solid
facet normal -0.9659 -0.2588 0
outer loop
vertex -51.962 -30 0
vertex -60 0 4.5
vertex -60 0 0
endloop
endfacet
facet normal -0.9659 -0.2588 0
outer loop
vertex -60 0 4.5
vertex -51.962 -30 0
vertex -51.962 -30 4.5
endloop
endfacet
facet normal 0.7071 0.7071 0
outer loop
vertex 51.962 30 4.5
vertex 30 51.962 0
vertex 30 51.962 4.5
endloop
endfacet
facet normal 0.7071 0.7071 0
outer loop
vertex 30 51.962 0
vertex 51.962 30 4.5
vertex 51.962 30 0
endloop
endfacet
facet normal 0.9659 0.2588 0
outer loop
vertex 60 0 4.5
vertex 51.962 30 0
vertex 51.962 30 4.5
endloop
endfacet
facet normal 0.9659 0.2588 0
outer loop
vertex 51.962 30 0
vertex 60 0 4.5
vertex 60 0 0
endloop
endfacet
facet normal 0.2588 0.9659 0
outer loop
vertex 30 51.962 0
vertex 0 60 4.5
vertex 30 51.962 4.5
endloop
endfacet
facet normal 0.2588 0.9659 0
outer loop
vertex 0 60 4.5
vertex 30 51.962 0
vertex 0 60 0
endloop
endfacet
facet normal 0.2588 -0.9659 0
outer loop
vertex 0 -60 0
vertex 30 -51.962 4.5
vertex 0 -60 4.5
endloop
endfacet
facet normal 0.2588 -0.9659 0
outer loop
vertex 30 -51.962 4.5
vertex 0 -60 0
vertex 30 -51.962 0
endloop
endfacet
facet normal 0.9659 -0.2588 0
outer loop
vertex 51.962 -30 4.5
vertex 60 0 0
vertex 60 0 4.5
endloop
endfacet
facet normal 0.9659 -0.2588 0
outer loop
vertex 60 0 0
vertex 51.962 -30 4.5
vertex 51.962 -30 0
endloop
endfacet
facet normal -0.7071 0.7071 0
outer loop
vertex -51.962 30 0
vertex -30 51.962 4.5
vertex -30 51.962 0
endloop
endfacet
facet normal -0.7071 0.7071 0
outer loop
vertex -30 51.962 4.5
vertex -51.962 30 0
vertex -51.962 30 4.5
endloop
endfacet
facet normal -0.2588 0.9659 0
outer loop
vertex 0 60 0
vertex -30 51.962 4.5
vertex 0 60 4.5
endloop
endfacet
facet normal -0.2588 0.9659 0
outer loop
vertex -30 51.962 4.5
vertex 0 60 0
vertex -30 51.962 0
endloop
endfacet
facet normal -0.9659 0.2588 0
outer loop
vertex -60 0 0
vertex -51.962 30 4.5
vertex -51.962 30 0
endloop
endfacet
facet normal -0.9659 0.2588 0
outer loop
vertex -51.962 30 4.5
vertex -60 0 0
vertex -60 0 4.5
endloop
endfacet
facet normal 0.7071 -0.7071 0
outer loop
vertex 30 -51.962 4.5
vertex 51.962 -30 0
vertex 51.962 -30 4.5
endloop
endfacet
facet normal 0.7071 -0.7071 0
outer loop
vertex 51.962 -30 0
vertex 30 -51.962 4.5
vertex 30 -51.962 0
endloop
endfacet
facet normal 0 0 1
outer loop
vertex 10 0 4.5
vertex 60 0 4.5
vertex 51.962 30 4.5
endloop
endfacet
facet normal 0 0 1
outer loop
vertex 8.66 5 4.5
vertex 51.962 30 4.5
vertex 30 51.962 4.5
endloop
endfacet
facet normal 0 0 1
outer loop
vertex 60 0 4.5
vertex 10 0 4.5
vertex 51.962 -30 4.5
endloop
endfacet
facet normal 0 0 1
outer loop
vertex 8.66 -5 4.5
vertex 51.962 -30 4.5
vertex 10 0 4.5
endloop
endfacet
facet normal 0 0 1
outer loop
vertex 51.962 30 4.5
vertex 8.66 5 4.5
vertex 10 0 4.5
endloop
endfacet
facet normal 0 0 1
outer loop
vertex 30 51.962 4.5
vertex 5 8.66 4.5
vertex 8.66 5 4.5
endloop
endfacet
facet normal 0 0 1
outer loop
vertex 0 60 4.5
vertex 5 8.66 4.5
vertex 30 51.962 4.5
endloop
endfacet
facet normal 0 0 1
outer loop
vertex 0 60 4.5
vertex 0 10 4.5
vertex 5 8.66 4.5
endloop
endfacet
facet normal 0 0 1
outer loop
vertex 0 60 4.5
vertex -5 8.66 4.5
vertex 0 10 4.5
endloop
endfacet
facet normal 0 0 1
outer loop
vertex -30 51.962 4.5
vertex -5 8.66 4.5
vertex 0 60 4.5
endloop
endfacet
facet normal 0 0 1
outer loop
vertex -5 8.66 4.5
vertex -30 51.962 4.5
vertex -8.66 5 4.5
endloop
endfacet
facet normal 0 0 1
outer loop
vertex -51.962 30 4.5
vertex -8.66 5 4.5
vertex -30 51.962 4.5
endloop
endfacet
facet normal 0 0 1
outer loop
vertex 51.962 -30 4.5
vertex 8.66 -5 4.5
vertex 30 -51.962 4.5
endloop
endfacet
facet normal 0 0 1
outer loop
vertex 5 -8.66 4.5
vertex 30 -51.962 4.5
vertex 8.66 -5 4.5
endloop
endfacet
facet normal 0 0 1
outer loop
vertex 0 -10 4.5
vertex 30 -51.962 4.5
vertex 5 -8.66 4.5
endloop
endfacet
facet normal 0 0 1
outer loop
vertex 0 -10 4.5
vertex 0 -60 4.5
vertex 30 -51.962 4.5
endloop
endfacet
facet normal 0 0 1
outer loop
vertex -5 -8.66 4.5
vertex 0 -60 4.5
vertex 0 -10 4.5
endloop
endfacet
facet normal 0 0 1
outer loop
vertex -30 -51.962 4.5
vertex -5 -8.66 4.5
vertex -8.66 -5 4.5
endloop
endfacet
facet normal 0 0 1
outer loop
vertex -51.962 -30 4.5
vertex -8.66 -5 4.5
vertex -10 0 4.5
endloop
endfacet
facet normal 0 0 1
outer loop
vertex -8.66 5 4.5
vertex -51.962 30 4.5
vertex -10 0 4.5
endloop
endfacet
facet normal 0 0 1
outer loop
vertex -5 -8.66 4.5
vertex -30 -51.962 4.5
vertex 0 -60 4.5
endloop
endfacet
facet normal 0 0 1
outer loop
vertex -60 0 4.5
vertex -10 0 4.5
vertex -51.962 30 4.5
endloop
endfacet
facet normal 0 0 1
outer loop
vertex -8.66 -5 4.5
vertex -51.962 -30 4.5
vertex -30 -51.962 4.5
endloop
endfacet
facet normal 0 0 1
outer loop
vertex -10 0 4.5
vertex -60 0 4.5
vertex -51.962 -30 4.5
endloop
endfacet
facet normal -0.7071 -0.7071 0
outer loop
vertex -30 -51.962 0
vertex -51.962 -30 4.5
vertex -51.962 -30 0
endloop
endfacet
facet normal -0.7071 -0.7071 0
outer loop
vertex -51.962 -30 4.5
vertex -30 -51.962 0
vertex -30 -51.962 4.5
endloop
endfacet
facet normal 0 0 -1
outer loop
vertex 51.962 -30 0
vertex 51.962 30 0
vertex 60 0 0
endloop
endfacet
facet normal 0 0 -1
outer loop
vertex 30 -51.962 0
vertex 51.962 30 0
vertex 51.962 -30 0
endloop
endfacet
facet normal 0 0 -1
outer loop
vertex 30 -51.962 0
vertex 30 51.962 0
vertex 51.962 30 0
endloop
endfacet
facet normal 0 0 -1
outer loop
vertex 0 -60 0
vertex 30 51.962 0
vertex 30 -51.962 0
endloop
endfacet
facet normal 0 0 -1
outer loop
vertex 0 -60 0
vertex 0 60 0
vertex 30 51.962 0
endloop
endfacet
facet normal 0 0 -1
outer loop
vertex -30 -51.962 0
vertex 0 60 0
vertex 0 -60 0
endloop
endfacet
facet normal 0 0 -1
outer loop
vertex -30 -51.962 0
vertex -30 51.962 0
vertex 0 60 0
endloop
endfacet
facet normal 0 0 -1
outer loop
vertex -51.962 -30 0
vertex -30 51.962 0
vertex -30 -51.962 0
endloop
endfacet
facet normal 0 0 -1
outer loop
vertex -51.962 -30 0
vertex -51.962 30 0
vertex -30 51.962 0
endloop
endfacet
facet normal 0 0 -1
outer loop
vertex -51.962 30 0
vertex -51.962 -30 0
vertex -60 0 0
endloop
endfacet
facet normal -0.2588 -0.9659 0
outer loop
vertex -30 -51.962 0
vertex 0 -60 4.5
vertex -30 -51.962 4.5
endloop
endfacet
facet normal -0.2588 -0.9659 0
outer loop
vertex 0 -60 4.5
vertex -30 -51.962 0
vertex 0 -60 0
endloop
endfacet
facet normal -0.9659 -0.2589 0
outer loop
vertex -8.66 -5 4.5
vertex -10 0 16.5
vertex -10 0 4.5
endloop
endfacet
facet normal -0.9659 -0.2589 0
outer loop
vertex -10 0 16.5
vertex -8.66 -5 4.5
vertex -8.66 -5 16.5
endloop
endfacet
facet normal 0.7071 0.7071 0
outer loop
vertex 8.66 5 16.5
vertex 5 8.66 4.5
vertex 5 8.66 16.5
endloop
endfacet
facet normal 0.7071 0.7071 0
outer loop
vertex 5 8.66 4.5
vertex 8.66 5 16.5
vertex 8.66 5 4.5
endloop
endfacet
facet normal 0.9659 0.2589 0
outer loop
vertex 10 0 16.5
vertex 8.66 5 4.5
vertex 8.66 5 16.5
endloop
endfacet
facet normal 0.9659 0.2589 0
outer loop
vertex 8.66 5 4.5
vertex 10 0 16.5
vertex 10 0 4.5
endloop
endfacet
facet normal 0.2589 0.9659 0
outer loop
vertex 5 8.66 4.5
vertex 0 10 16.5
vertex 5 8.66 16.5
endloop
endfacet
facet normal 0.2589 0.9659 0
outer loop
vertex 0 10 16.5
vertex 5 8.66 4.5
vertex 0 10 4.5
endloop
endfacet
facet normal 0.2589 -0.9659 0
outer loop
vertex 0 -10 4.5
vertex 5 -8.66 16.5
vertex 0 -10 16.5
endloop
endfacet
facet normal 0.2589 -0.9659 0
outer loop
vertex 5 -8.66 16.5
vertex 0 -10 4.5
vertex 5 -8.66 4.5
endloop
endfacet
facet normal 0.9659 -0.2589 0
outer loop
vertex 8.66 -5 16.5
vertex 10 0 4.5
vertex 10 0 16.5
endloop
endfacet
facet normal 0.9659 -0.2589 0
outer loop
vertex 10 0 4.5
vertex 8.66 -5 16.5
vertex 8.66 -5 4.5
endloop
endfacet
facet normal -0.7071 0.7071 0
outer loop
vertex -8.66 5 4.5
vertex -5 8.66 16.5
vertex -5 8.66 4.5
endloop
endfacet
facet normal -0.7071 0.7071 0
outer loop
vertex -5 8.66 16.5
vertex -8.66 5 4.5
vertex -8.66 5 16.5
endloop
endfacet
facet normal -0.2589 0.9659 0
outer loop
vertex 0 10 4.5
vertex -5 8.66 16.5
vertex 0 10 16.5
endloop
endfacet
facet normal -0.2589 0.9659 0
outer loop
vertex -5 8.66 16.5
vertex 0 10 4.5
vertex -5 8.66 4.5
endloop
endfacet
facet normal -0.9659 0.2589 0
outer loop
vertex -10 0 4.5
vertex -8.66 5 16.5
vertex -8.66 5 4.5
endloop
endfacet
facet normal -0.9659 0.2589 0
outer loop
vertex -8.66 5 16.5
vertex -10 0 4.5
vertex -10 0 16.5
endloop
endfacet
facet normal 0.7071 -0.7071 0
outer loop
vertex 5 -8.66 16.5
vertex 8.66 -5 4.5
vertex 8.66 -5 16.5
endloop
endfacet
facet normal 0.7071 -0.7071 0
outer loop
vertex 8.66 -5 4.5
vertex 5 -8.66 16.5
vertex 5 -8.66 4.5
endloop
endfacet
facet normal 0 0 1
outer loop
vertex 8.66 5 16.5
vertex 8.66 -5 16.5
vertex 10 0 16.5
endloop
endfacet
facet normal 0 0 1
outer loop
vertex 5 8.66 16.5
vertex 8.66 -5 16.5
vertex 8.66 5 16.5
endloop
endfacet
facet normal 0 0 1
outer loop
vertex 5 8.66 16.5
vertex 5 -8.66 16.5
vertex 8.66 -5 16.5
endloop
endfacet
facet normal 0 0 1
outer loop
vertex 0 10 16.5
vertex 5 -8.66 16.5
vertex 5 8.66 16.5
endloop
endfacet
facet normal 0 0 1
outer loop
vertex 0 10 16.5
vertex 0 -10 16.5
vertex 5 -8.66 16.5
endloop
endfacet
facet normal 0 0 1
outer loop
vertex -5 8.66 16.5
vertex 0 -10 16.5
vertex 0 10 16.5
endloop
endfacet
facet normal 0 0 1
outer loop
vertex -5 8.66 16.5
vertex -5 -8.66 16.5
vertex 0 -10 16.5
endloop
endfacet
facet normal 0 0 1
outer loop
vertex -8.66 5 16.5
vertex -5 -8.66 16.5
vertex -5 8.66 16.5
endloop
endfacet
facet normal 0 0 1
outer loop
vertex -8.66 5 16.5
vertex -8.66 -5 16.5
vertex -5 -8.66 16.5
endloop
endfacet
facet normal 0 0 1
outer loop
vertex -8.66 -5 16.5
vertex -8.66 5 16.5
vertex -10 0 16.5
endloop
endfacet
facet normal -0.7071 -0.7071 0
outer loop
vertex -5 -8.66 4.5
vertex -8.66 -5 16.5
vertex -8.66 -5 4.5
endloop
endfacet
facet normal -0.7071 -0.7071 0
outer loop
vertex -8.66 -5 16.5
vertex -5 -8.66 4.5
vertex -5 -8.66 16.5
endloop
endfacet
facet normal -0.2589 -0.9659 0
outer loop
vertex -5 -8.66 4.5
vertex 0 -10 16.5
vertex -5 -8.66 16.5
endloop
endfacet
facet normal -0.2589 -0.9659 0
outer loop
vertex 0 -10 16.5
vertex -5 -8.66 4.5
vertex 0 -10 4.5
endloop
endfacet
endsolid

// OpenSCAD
// file: InFluMa_Holes.scad
NoA=3;

// Bohrungen ====================================

DACO=8;     //Diameter Axis Cut Out
DScDAS=3;   //Diameter Screw Disc Attach Star
DScDASHAD=DScDAS*4;// Diameter Screw Head Disc Attach Star
DoBearFit=22;	//Diameter of Bearing

Pos_X=0;
Pos_Y=0;
Pos_Z=0;

// Dimensions ====================================

HoDAS=15;   //Height of DiscAttachStar

AHDC=100; // Atach Hole Diameter Circle

//AxisCutOut();

// Helping Parameters ====================================

MFN=12; // Main Faccette Number

// ====================================

AxisCutOut(Pos_X,Pos_Y,Pos_Z,DACO);
AttachScrews(NoA,AHDC);

module AxisCutOut(Pos_X,Pos_Y,Pos_Z,DACO){
	translate([Pos_X,Pos_Y,Pos_Z]){
		cylinder(h=HoDAS*20,d1=DACO,d2=DACO,center=true,$fn=MFN);
	}
}

module AttachScrews(NoA,AHDC){
AbArm=360/NoA;  // Angle between Arms
     for(i=[0:AbArm:360]){
        rotate([0,0,i]){
            translate([AHDC/2,0,0]){
                cylinder(66,d1=DScDAS,d2=DScDAS,center=true,$fn=MFN);
				AttachScrewsRest();				
/*				translate([0,0,HoDAS/2.3]){
					hull(){
						cylinder(HoDAS,d1=DScDAS*3,d2=DScDAS*3,center=true,$fn=MFN);
						translate([DScDAS*3,0,0]){
							cylinder(HoDAS,d1=DScDAS*3,d2=DScDAS*3,center=true,$fn=MFN);
						}
					}
				}*/
            }
         }
     }
 }
 
module AttachScrewsRest(){
translate([0,0,HoDAS/2]){
	hull(){
		cylinder(HoDAS,d1=DScDASHAD,d2=DScDASHAD,center=true,$fn=MFN);
			translate([DScDAS*3,0,0]){
				cylinder(HoDAS,d1=DScDASHAD,d2=DScDASHAD,center=true,$fn=MFN);
			}
		}
	}
}
// main file
use<InFluMa_Holes.scad>

// Influenzmaschiene

// Bohrungen ====================================

DACO=8;     //Diameter Axis Cut Out
// DScDAS=3;   //Diameter Screw Disc Attach Star
HoBearFit=7;	//Height of Bearing
DoBearFit=22;	//Diameter of Bearing

// Parameters ====================================

NoA=4;  // Number of Arms
//AbArm=360/NoA;  // Angle between Arms
//a=5;

// Dimensions ====================================

//AHDC=DoBearFit*5; // Atach Hole Diameter Circle
HoDAS=5;   //Height of DiscAttachStar
DoDD=120;   //Diameter of Drive Disc

//DoBltDrf=3;			// Diameter of the Belt that drives the Disc
//HoDD=DoBltDrf*3/2;		// Height of Drive Disc
//HoBarDD=12;			// Height of Barrel of Disc Drive

//HoBar=20;
//DoBar=DoBearFit*1.5;	//Diameter of Barrel

//DoBarDD=DoBearFit*1;		// Diameter of Barel of Disc Drive

// Belt Drive	====================================
DoBltDrf=3;			// Diameter of the Belt that drives the Disc 
					// (Crosssection, not the length)
DoDD=120;   		// Diameter of Drive Disc
HoDD=DoBltDrf*3/2;	// Height of Drive Disc
HoBarDD=12;			// Height of Barrel of Disc Drive
DoBarDD=20;			// Diameter of Barel of Disc Drive

// Helping Parameters ====================================

MFN=12; // Main Faccette Number
Device_Prm=2;	// Parameter to tetermine a Parameter for diferent usecases of the Star module, either it is used in the Mount of the Disk or to Generate a Spokeweel for the Drive.
// ====================================

// Canvas ====================================
Drive_Disc();
module Drive_Disc(){
	union(){
		Star_Dri(NoA,HoDD,HoBarDD,DoDD,DoBarDD);
		mirror([0,0,1]){
			//Star_Dri(NoA,HoDD,HoBarDD,DoDD,DoBarDD);
		//echo(AbArm);
		}
	}
}
// Parts ====================================
module Star_Dri(NoA,HoDD,HoBarDD,DoDD,DoBarDD,BDinpPosZ){
translate([0,0,HoDD/2]){
		union(){
			difference(){    
				union(){
					cylinder(h=HoDD,d1=DoDD,d2=DoDD,center=true,$fn=MFN);
				}
				//~DISABLED_FOR_PERFORMANCE~ArmCutouts_Dri(NoA);
				translate([0,0,HoDD/4]){
				}	
			}
			translate([0,0,HoDD/2+HoBarDD/2]){
				Barrel_Dri(HoBarDD,DoBarDD);
			}
		}
	}
}

// Cut Outs ====================================
module AxisCutOut_Dri(){
    cylinder(h=HoDD*3,d1=DACO,d2=DACO,center=true,$fn=MFN);
}
 module ArmCutouts_Dri(NoA){
	 AbArm=360/NoA;  				// Angle between Arms
         for(i=[0:AbArm:360]){
           rotate([0,0,i+AbArm/2]){
                translate([DoDD/3.5,0,0]){
                    ArmCut_Single_Dri();
                }
             }
         }
     }	      
 module ArmCut_Single_Dri(){
     hull(){
         cylinder(HoDD+0.01,DoDD*0.08,DoDD*0.15,center=true, $fn=MFN);
         translate([DoDD/16,-10,0]){
            cylinder(HoDD+0.01,DoDD/NoA*0.30,DoDD/NoA*0.40,center=true, $fn=MFN);
         }
		 translate([DoDD/16,10,0]){
            cylinder(HoDD+0.01,DoDD/NoA*0.30,DoDD/NoA*0.40,center=true, $fn=MFN);
         }
     }
 }

module ArmCut_Tips_Dri(Device_Prm,Cut_Help){
	if (false){
		difference(){
			cylinder(HoDD+0.01,d1=DoDD*1.1,d2=DoDD*1.1,center=true, $fn=MFN);
			cylinder(HoDD+0.02,d1=DoDD,d2=DoDD-(HoDD-0.02)*2,center=true, $fn=MFN);
		}
	}
	else if (true){
		difference(){
			 cylinder(HoDD+0.01+Cut_Help,d1=DoDD*1.1,d2=DoDD*1.1,center=true, $fn=MFN);
			 cylinder(HoDD+0.02+Cut_Help,d1=DoDD-(HoDD-0.02)*2,d2=DoDD-(HoDD-0.02)*2,center=true, $fn=MFN);
		 }
	}		
}
module ArmCut_Tips_2_Dri(Device_Prm){
     difference(){
         cylinder((HoDD+0.03)/2,d1=DoDD*1.1,d2=DoDD*1.1,center=true, $fn=MFN);
         cylinder((HoDD+0.04)/2,d1=DoDD,d2=DoBar,center=true, $fn=MFN); //D2=> was "DoDD-(HoDAS-0.02)*8+12"
     }
 }
module Barrel_Dri(HoBarDD,DoBarDD){
		cylinder(HoBarDD,d1=DoBarDD,d2=DoBarDD,center=true,$fn=MFN);
}
